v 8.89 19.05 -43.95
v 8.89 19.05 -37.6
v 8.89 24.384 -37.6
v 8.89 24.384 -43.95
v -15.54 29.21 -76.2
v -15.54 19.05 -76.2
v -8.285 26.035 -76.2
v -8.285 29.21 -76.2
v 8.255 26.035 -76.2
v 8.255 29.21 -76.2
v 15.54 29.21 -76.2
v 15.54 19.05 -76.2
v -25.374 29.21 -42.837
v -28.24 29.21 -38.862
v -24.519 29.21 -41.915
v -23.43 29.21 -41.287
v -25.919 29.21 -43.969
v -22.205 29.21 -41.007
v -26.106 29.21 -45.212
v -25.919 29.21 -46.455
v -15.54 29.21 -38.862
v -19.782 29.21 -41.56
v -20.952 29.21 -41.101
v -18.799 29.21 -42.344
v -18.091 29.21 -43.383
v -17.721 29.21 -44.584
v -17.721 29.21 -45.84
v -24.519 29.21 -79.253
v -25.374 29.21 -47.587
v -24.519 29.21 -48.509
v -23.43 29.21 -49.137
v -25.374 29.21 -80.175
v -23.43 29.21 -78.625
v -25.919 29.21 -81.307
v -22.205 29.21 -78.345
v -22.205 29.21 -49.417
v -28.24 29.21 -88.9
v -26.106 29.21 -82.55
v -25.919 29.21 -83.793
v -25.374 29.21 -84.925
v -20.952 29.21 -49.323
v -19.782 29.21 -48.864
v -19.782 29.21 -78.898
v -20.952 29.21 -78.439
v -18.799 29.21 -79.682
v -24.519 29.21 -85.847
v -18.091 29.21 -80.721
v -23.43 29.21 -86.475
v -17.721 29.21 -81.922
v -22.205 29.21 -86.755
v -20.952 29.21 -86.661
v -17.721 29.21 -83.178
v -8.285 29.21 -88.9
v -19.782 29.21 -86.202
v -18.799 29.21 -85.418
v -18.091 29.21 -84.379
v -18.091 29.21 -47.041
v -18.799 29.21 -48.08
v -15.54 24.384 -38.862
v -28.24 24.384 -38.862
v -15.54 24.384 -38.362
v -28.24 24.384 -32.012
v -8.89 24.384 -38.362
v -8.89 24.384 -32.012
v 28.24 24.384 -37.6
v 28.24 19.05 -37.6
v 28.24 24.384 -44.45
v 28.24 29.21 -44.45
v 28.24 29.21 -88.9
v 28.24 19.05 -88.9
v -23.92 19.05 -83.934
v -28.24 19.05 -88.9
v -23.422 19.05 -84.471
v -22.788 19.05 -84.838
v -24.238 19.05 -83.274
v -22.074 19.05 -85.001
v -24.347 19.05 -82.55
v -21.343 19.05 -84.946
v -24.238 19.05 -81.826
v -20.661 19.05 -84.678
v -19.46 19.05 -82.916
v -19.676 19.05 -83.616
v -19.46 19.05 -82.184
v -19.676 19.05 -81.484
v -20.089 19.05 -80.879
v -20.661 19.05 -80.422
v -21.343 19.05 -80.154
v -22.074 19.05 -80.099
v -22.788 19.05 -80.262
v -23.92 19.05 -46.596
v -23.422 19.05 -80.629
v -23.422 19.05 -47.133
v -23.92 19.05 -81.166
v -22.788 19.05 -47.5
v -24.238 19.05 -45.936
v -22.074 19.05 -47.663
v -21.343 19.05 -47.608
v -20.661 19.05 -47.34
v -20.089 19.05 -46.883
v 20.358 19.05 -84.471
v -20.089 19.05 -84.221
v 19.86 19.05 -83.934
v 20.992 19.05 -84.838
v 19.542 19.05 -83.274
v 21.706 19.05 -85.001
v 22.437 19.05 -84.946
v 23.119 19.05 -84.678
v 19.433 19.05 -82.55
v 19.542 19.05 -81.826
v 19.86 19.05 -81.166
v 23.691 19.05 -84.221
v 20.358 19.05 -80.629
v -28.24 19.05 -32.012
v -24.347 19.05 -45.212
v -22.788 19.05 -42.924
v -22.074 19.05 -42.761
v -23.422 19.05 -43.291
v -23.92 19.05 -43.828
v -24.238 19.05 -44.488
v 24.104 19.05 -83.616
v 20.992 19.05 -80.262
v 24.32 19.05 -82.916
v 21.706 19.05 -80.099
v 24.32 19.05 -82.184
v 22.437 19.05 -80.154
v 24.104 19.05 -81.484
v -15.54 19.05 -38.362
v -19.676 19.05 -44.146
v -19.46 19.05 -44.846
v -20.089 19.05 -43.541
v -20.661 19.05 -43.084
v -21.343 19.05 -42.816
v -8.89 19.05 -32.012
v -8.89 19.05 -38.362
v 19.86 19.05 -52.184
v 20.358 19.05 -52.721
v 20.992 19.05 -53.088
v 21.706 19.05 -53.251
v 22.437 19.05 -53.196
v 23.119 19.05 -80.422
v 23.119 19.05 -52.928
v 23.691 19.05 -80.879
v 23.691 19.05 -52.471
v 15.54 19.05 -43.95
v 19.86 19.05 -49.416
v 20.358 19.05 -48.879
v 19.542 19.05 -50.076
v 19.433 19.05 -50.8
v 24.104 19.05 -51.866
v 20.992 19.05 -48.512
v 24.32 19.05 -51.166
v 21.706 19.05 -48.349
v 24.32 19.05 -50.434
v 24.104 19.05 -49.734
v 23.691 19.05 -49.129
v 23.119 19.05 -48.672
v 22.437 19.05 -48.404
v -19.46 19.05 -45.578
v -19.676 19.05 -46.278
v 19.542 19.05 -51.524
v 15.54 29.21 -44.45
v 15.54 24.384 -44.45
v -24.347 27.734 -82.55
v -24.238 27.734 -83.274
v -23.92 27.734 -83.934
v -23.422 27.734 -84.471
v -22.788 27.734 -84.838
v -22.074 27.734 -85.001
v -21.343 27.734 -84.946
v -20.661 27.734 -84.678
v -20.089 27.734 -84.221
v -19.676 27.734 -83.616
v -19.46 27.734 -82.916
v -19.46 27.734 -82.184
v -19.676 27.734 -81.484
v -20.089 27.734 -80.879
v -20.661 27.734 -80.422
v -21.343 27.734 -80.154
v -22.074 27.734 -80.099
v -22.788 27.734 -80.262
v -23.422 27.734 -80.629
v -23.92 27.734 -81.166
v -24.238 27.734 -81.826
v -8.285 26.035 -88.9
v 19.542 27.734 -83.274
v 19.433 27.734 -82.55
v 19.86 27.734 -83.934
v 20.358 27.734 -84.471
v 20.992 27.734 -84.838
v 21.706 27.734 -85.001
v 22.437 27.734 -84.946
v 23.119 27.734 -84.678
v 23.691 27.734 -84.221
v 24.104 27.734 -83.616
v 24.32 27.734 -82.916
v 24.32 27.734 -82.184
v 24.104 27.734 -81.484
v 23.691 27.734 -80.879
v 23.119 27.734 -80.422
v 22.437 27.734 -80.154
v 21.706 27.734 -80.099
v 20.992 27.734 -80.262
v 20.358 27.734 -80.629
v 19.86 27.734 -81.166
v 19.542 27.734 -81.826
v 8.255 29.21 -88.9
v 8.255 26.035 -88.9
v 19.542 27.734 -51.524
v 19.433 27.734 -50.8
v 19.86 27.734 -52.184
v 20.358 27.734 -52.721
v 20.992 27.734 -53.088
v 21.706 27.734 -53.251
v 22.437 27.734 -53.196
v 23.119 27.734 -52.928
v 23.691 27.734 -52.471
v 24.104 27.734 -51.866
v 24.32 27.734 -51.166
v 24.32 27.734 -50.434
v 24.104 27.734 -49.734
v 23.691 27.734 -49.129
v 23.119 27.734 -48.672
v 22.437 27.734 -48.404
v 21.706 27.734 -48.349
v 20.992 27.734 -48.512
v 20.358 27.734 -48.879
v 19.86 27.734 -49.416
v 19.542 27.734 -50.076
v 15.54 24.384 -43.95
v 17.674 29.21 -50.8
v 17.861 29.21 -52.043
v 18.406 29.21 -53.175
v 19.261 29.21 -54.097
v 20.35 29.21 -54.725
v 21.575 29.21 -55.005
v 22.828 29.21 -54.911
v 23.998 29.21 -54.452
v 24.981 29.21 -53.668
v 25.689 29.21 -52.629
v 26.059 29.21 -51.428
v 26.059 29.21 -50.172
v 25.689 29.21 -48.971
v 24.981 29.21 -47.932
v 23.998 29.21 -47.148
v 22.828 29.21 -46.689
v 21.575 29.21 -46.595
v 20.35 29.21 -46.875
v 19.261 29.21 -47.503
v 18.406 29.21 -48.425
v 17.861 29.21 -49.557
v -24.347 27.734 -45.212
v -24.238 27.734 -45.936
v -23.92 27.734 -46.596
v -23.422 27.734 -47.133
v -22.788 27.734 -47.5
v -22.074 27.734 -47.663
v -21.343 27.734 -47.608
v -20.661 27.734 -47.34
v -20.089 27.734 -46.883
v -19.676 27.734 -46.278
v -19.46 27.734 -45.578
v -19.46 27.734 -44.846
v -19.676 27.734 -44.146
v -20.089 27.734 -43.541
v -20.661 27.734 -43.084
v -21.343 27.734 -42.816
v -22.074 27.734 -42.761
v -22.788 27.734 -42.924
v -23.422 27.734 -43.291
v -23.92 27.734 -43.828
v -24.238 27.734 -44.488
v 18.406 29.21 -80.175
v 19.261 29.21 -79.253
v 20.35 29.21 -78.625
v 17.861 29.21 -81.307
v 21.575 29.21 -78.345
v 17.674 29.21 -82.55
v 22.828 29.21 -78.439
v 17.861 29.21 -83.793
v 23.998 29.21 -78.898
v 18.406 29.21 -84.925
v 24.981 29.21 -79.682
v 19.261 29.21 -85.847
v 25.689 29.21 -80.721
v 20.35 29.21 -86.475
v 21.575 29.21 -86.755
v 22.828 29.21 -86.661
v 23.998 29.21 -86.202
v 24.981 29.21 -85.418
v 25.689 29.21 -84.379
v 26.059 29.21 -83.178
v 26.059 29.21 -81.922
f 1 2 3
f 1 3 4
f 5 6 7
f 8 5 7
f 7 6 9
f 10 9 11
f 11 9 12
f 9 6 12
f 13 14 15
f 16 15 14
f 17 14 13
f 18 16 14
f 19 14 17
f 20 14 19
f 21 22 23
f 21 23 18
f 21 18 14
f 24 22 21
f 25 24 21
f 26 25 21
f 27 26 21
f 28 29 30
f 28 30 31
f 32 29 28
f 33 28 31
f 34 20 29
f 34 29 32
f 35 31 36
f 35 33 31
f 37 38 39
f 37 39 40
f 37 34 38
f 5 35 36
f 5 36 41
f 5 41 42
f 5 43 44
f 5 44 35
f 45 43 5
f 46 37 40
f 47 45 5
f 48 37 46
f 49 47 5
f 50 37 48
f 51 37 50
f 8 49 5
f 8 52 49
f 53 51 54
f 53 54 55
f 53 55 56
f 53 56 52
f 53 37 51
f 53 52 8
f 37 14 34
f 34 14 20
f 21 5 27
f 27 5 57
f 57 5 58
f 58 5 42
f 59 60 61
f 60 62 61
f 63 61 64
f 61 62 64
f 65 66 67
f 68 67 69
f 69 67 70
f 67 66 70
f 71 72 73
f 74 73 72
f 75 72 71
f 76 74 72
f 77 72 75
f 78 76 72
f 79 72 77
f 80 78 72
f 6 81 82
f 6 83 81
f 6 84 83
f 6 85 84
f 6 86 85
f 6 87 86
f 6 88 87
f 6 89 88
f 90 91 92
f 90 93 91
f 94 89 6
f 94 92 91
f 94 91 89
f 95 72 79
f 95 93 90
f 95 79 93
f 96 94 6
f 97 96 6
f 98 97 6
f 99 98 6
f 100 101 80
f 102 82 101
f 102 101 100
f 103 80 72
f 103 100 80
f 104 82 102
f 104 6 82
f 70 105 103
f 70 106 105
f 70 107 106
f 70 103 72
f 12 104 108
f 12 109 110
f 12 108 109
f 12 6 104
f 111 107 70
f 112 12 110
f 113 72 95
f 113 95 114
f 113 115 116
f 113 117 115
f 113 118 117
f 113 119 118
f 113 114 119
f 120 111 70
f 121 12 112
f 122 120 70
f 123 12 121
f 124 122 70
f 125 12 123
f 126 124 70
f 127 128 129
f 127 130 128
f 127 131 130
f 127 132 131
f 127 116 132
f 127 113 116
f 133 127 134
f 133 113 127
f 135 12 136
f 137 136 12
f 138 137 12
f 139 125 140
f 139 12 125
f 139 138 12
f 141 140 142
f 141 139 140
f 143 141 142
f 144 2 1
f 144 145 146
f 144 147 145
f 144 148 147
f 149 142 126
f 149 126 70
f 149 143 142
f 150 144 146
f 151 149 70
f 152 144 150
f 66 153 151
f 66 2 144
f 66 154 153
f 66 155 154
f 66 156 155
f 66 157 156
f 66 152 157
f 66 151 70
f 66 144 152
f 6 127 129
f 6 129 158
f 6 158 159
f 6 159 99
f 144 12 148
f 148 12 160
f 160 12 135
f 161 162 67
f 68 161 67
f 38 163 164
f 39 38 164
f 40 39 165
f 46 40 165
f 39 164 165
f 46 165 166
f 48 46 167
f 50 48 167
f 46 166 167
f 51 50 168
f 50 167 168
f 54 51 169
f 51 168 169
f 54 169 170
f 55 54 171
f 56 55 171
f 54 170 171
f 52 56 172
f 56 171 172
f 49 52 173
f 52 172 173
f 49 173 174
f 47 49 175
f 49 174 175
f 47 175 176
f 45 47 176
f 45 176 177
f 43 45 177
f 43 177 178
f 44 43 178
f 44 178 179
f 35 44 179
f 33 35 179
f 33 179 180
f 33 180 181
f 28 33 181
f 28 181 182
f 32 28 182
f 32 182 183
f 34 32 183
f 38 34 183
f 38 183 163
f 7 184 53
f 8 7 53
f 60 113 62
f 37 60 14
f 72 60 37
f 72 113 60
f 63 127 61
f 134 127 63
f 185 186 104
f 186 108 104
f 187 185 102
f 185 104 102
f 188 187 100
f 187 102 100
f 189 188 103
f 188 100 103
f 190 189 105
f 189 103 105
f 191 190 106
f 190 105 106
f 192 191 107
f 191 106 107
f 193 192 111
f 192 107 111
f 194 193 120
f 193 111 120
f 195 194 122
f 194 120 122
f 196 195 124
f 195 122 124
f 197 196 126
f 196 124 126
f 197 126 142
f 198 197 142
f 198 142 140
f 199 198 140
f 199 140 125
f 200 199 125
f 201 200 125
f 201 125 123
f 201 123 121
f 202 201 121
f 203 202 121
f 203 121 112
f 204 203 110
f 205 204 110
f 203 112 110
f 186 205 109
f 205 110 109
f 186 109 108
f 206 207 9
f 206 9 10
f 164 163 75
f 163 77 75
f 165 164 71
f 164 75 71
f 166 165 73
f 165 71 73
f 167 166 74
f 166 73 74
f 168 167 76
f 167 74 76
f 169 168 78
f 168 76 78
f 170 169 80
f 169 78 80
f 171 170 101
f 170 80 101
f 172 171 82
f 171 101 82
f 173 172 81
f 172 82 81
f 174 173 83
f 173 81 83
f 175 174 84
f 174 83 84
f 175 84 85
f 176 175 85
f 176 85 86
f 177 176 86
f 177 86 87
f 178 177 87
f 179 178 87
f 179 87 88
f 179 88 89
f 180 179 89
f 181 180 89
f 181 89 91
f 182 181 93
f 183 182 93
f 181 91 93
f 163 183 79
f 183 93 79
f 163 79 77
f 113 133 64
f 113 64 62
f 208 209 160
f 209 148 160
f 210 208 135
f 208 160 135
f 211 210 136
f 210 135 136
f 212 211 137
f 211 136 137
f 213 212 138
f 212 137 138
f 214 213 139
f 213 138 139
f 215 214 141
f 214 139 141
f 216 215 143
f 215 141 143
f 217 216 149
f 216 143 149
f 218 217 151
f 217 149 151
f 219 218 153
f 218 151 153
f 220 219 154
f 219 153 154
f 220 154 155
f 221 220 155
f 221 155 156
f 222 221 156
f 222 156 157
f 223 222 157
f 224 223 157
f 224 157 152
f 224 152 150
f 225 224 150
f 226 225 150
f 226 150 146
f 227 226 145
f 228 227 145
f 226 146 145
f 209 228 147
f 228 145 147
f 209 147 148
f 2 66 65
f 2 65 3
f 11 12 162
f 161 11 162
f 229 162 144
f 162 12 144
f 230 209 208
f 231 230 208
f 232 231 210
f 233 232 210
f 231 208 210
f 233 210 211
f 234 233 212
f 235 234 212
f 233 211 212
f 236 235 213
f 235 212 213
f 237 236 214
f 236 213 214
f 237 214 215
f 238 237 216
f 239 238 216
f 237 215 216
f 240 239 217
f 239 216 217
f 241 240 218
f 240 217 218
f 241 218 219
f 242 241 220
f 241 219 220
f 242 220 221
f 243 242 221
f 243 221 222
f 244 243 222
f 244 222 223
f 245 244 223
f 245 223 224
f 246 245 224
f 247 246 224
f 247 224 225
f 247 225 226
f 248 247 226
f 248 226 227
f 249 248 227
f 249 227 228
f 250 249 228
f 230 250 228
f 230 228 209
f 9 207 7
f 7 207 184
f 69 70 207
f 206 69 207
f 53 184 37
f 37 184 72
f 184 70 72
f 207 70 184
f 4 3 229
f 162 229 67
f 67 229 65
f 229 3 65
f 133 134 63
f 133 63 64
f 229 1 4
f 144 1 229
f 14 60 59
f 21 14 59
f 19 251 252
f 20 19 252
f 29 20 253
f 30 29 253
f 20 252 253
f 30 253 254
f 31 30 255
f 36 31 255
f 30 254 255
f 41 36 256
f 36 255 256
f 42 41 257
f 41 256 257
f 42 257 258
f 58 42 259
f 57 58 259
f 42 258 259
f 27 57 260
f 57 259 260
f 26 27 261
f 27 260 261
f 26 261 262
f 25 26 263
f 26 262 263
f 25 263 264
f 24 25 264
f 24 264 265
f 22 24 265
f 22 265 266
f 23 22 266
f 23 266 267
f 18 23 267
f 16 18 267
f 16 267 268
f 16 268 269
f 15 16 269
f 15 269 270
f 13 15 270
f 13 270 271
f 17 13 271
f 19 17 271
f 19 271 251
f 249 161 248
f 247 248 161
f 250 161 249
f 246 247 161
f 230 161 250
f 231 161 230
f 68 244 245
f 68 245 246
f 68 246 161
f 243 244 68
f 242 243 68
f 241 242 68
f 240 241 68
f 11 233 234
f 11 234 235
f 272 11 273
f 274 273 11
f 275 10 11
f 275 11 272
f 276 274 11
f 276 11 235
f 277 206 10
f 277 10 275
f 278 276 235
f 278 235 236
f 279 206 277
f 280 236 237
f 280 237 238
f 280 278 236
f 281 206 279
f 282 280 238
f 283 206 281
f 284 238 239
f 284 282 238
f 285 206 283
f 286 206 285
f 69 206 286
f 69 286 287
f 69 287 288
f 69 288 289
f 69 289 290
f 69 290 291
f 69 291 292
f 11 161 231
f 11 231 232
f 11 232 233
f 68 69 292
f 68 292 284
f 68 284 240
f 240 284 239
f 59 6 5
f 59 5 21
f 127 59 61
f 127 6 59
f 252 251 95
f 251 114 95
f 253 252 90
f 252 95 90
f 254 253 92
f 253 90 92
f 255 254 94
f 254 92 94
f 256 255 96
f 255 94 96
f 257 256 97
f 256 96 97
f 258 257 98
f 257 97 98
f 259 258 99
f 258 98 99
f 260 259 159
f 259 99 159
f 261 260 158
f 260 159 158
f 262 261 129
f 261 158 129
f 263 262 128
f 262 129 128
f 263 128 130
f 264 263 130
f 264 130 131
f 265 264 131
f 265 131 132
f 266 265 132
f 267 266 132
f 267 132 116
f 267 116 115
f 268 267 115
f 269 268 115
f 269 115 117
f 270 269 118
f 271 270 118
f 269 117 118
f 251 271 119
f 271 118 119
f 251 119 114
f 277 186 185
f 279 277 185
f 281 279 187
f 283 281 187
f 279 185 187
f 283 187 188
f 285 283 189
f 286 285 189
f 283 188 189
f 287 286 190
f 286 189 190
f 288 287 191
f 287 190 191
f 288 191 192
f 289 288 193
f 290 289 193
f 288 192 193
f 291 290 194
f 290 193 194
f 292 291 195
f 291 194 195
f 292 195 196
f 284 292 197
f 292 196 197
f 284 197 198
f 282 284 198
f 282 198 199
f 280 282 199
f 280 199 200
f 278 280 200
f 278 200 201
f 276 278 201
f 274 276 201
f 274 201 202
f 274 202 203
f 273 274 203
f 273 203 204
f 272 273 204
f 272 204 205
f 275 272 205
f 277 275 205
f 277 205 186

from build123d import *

# Parameters (mm, degrees)
BOSS_EXTRUDE1_DEPTH                               = 10.16
CSK_FOR_8_FLAT_HEAD_MACHINE_SCREW_100_D           = 4.9149
CSK_FOR_8_FLAT_HEAD_MACHINE_SCREW_100_CSINK_D     = 8.4328
CSK_FOR_8_FLAT_HEAD_MACHINE_SCREW_100_CSINK_ANGLE = 100
SKETCH5_W                                         = 16.54
SKETCH5_H                                         = 3.175
CUT_EXTRUDE1_DEPTH                                = 51.038
SKETCH6_W                                         = 12.7
SKETCH6_H                                         = 0.5
BOSS_EXTRUDE2_DEPTH                               = 5.334


with BuildPart() as part:
    # Sketch1 → Boss-Extrude1 (new body)
    with BuildSketch(Plane(origin=(0, 19.05, 0), x_dir=(1, 0, 0), z_dir=(0, 1, 0))):
        Polygon((15.54, 76.2), (15.54, 44.45), (28.24, 44.45), (28.24, 88.9), (-28.24, 88.9), (-28.24, 38.862), (-15.54, 38.862), (-15.54, 76.2), align=None)
    extrude(amount=BOSS_EXTRUDE1_DEPTH)

    # CSK for #8 Flat Head Machine Screw (100)1 (through all)
    with Locations(Plane(origin=(0, 29.21, 0), x_dir=(1, 0, 0), z_dir=(0, 1, 0))):
        with Locations((-21.89, 82.55), (21.89, 82.55), (-21.89, 45.212), (21.89, 50.8)):
            CounterSinkHole(CSK_FOR_8_FLAT_HEAD_MACHINE_SCREW_100_D / 2, CSK_FOR_8_FLAT_HEAD_MACHINE_SCREW_100_CSINK_D / 2, counter_sink_angle=CSK_FOR_8_FLAT_HEAD_MACHINE_SCREW_100_CSINK_ANGLE)

    # Sketch5 → Cut-Extrude1 (cut, through all)
    with BuildSketch(Plane(origin=(0, 0, -88.9), x_dir=(-1, 0, 0), z_dir=(0, 0, -1))):
        with Locations((0.015, 27.6225)):
            Rectangle(SKETCH5_W, SKETCH5_H)
    extrude(amount=-CUT_EXTRUDE1_DEPTH, mode=Mode.SUBTRACT)

    # Sketch6 → Boss-Extrude2 (add)
    with BuildSketch(Plane.XZ.offset(-19.05)):
        with Locations((-21.89, -38.612)):
            Rectangle(SKETCH6_W, SKETCH6_H)
        Polygon((-28.24, -32.012), (-28.24, -38.362), (-15.54, -38.362), (-8.89, -38.362), (-8.89, -32.012), align=None)
        with Locations((21.89, -44.2)):
            Rectangle(SKETCH6_W, SKETCH6_H)
        Polygon((8.89, -43.95), (15.54, -43.95), (28.24, -43.95), (28.24, -37.6), (8.89, -37.6), align=None)
    extrude(amount=-BOSS_EXTRUDE2_DEPTH)


solid = part.part
